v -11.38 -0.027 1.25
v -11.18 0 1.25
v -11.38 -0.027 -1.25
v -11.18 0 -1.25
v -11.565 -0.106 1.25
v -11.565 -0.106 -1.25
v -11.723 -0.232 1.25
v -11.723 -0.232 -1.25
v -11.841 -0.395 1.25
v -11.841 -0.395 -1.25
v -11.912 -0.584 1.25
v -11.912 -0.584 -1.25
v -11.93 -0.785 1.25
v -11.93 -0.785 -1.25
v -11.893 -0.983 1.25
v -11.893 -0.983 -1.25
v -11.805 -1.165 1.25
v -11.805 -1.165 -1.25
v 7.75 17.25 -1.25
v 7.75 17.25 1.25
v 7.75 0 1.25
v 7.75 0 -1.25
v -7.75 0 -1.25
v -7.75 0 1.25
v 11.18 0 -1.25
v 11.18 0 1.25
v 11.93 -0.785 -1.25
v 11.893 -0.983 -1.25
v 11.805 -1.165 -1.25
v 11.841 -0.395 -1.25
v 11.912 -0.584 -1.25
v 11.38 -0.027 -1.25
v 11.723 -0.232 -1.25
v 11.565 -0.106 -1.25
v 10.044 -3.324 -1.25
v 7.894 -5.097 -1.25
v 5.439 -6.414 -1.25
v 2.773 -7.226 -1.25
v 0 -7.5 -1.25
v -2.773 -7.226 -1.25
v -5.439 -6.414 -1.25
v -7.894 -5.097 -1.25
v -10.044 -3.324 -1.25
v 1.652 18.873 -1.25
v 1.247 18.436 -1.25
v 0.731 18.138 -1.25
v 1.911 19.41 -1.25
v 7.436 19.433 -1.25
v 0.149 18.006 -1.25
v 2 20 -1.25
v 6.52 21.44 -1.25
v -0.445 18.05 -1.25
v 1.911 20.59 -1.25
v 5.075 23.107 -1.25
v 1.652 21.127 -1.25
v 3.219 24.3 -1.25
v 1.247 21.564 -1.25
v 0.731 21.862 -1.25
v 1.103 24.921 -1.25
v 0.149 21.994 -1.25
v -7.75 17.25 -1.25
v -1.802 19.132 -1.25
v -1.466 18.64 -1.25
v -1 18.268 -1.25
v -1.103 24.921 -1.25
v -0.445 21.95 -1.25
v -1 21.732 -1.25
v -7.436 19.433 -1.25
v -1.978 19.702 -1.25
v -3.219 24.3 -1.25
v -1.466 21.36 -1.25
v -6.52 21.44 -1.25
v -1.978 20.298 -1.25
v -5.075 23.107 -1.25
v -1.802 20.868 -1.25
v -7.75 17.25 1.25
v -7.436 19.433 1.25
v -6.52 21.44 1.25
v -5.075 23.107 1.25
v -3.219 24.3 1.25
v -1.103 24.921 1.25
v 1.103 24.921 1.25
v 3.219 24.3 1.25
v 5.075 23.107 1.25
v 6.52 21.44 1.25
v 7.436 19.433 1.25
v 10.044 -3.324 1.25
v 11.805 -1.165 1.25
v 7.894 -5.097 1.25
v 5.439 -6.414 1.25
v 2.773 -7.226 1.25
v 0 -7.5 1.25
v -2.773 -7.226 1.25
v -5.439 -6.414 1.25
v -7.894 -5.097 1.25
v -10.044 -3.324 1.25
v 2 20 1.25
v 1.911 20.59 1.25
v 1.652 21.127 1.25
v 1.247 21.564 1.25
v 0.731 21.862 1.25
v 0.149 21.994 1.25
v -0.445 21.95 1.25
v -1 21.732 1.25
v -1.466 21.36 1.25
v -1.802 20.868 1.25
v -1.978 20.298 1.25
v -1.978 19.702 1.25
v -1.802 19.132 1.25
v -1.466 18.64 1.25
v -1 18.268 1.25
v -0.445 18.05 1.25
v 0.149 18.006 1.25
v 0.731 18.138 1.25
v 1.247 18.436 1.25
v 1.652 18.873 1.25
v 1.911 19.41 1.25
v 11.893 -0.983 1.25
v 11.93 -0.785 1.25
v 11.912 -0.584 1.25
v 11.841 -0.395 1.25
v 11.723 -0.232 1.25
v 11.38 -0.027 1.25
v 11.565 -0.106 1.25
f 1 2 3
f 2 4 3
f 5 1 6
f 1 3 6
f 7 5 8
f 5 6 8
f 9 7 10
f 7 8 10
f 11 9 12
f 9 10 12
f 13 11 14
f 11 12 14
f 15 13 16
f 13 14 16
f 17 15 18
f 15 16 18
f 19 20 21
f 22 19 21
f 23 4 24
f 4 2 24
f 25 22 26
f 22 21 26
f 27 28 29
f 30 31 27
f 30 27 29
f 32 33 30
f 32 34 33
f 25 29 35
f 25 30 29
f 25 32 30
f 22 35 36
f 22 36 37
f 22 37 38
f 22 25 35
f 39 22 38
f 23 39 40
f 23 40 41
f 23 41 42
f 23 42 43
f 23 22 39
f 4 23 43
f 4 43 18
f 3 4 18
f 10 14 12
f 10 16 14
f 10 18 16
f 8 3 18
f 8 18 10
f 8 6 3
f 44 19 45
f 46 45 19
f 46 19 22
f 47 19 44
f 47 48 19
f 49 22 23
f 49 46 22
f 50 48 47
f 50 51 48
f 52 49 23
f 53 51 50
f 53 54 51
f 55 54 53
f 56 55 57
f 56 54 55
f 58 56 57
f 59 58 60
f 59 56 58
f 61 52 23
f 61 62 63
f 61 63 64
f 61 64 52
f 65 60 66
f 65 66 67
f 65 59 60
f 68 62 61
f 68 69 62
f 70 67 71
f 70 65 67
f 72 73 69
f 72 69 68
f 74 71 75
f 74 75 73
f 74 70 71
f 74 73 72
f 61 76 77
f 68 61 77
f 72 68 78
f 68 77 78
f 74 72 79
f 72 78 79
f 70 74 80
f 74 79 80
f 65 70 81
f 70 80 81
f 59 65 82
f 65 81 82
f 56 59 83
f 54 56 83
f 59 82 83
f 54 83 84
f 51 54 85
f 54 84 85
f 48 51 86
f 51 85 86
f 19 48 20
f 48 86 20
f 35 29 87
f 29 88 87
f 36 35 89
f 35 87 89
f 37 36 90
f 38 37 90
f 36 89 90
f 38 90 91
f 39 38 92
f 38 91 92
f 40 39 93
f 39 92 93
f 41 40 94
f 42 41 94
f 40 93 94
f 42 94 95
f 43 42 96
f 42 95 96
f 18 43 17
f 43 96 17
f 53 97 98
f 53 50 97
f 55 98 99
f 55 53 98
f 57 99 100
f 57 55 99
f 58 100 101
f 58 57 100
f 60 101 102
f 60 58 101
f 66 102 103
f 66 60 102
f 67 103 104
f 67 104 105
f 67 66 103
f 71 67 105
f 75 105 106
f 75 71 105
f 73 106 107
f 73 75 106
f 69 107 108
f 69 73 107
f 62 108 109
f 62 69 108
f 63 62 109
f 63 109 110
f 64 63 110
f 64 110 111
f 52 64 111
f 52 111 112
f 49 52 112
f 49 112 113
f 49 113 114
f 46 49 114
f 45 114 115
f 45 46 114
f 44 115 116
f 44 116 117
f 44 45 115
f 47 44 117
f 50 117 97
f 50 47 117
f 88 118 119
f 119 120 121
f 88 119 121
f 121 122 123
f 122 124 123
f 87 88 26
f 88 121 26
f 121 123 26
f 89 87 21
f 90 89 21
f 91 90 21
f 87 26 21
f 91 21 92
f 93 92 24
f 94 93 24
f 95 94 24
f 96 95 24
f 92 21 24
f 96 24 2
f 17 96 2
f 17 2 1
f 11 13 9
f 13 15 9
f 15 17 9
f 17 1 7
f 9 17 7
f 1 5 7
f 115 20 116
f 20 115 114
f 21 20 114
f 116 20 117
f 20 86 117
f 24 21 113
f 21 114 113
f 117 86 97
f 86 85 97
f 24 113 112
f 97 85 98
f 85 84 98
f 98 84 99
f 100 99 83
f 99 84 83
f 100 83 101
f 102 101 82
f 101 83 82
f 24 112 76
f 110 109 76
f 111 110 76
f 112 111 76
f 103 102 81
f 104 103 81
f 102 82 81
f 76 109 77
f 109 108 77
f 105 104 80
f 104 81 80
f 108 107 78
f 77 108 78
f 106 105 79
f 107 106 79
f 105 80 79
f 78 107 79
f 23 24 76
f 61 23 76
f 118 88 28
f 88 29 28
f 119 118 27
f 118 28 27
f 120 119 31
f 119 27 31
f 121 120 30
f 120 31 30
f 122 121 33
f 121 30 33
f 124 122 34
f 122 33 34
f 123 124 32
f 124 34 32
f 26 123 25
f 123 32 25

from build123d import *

# Parameters (mm, degrees)
SKETCH1_R           = 2
BOSS_EXTRUDE1_DEPTH = 1.25
FILLET1_R           = 0.75


with BuildPart() as part:
    # Sketch1 → Boss-Extrude1 (new, symmetric)
    with BuildSketch(Plane.XY):
        with BuildLine():
            Line((7.75, 17.25), (7.75, 0))
            Line((7.75, 0), (12.5, 0))
            ThreePointArc((12.5, 0), (0, -7.5), (-12.5, 0))
            Line((-12.5, 0), (-7.75, 0))
            Line((-7.75, 0), (-7.75, 17.25))
            ThreePointArc((-7.75, 17.25), (0, 25), (7.75, 17.25))
        make_face()
        with Locations((0, 20)):
            Circle(SKETCH1_R, mode=Mode.SUBTRACT)
    extrude(amount=BOSS_EXTRUDE1_DEPTH, both=True)

    # Fillet1
    fillet1_edges = [part.edges().sort_by_distance(p)[0] for p in [
        (12.5, 0, 0),
        (-12.5, 0, 0),
    ]]
    fillet(fillet1_edges, radius=FILLET1_R)


solid = part.part
